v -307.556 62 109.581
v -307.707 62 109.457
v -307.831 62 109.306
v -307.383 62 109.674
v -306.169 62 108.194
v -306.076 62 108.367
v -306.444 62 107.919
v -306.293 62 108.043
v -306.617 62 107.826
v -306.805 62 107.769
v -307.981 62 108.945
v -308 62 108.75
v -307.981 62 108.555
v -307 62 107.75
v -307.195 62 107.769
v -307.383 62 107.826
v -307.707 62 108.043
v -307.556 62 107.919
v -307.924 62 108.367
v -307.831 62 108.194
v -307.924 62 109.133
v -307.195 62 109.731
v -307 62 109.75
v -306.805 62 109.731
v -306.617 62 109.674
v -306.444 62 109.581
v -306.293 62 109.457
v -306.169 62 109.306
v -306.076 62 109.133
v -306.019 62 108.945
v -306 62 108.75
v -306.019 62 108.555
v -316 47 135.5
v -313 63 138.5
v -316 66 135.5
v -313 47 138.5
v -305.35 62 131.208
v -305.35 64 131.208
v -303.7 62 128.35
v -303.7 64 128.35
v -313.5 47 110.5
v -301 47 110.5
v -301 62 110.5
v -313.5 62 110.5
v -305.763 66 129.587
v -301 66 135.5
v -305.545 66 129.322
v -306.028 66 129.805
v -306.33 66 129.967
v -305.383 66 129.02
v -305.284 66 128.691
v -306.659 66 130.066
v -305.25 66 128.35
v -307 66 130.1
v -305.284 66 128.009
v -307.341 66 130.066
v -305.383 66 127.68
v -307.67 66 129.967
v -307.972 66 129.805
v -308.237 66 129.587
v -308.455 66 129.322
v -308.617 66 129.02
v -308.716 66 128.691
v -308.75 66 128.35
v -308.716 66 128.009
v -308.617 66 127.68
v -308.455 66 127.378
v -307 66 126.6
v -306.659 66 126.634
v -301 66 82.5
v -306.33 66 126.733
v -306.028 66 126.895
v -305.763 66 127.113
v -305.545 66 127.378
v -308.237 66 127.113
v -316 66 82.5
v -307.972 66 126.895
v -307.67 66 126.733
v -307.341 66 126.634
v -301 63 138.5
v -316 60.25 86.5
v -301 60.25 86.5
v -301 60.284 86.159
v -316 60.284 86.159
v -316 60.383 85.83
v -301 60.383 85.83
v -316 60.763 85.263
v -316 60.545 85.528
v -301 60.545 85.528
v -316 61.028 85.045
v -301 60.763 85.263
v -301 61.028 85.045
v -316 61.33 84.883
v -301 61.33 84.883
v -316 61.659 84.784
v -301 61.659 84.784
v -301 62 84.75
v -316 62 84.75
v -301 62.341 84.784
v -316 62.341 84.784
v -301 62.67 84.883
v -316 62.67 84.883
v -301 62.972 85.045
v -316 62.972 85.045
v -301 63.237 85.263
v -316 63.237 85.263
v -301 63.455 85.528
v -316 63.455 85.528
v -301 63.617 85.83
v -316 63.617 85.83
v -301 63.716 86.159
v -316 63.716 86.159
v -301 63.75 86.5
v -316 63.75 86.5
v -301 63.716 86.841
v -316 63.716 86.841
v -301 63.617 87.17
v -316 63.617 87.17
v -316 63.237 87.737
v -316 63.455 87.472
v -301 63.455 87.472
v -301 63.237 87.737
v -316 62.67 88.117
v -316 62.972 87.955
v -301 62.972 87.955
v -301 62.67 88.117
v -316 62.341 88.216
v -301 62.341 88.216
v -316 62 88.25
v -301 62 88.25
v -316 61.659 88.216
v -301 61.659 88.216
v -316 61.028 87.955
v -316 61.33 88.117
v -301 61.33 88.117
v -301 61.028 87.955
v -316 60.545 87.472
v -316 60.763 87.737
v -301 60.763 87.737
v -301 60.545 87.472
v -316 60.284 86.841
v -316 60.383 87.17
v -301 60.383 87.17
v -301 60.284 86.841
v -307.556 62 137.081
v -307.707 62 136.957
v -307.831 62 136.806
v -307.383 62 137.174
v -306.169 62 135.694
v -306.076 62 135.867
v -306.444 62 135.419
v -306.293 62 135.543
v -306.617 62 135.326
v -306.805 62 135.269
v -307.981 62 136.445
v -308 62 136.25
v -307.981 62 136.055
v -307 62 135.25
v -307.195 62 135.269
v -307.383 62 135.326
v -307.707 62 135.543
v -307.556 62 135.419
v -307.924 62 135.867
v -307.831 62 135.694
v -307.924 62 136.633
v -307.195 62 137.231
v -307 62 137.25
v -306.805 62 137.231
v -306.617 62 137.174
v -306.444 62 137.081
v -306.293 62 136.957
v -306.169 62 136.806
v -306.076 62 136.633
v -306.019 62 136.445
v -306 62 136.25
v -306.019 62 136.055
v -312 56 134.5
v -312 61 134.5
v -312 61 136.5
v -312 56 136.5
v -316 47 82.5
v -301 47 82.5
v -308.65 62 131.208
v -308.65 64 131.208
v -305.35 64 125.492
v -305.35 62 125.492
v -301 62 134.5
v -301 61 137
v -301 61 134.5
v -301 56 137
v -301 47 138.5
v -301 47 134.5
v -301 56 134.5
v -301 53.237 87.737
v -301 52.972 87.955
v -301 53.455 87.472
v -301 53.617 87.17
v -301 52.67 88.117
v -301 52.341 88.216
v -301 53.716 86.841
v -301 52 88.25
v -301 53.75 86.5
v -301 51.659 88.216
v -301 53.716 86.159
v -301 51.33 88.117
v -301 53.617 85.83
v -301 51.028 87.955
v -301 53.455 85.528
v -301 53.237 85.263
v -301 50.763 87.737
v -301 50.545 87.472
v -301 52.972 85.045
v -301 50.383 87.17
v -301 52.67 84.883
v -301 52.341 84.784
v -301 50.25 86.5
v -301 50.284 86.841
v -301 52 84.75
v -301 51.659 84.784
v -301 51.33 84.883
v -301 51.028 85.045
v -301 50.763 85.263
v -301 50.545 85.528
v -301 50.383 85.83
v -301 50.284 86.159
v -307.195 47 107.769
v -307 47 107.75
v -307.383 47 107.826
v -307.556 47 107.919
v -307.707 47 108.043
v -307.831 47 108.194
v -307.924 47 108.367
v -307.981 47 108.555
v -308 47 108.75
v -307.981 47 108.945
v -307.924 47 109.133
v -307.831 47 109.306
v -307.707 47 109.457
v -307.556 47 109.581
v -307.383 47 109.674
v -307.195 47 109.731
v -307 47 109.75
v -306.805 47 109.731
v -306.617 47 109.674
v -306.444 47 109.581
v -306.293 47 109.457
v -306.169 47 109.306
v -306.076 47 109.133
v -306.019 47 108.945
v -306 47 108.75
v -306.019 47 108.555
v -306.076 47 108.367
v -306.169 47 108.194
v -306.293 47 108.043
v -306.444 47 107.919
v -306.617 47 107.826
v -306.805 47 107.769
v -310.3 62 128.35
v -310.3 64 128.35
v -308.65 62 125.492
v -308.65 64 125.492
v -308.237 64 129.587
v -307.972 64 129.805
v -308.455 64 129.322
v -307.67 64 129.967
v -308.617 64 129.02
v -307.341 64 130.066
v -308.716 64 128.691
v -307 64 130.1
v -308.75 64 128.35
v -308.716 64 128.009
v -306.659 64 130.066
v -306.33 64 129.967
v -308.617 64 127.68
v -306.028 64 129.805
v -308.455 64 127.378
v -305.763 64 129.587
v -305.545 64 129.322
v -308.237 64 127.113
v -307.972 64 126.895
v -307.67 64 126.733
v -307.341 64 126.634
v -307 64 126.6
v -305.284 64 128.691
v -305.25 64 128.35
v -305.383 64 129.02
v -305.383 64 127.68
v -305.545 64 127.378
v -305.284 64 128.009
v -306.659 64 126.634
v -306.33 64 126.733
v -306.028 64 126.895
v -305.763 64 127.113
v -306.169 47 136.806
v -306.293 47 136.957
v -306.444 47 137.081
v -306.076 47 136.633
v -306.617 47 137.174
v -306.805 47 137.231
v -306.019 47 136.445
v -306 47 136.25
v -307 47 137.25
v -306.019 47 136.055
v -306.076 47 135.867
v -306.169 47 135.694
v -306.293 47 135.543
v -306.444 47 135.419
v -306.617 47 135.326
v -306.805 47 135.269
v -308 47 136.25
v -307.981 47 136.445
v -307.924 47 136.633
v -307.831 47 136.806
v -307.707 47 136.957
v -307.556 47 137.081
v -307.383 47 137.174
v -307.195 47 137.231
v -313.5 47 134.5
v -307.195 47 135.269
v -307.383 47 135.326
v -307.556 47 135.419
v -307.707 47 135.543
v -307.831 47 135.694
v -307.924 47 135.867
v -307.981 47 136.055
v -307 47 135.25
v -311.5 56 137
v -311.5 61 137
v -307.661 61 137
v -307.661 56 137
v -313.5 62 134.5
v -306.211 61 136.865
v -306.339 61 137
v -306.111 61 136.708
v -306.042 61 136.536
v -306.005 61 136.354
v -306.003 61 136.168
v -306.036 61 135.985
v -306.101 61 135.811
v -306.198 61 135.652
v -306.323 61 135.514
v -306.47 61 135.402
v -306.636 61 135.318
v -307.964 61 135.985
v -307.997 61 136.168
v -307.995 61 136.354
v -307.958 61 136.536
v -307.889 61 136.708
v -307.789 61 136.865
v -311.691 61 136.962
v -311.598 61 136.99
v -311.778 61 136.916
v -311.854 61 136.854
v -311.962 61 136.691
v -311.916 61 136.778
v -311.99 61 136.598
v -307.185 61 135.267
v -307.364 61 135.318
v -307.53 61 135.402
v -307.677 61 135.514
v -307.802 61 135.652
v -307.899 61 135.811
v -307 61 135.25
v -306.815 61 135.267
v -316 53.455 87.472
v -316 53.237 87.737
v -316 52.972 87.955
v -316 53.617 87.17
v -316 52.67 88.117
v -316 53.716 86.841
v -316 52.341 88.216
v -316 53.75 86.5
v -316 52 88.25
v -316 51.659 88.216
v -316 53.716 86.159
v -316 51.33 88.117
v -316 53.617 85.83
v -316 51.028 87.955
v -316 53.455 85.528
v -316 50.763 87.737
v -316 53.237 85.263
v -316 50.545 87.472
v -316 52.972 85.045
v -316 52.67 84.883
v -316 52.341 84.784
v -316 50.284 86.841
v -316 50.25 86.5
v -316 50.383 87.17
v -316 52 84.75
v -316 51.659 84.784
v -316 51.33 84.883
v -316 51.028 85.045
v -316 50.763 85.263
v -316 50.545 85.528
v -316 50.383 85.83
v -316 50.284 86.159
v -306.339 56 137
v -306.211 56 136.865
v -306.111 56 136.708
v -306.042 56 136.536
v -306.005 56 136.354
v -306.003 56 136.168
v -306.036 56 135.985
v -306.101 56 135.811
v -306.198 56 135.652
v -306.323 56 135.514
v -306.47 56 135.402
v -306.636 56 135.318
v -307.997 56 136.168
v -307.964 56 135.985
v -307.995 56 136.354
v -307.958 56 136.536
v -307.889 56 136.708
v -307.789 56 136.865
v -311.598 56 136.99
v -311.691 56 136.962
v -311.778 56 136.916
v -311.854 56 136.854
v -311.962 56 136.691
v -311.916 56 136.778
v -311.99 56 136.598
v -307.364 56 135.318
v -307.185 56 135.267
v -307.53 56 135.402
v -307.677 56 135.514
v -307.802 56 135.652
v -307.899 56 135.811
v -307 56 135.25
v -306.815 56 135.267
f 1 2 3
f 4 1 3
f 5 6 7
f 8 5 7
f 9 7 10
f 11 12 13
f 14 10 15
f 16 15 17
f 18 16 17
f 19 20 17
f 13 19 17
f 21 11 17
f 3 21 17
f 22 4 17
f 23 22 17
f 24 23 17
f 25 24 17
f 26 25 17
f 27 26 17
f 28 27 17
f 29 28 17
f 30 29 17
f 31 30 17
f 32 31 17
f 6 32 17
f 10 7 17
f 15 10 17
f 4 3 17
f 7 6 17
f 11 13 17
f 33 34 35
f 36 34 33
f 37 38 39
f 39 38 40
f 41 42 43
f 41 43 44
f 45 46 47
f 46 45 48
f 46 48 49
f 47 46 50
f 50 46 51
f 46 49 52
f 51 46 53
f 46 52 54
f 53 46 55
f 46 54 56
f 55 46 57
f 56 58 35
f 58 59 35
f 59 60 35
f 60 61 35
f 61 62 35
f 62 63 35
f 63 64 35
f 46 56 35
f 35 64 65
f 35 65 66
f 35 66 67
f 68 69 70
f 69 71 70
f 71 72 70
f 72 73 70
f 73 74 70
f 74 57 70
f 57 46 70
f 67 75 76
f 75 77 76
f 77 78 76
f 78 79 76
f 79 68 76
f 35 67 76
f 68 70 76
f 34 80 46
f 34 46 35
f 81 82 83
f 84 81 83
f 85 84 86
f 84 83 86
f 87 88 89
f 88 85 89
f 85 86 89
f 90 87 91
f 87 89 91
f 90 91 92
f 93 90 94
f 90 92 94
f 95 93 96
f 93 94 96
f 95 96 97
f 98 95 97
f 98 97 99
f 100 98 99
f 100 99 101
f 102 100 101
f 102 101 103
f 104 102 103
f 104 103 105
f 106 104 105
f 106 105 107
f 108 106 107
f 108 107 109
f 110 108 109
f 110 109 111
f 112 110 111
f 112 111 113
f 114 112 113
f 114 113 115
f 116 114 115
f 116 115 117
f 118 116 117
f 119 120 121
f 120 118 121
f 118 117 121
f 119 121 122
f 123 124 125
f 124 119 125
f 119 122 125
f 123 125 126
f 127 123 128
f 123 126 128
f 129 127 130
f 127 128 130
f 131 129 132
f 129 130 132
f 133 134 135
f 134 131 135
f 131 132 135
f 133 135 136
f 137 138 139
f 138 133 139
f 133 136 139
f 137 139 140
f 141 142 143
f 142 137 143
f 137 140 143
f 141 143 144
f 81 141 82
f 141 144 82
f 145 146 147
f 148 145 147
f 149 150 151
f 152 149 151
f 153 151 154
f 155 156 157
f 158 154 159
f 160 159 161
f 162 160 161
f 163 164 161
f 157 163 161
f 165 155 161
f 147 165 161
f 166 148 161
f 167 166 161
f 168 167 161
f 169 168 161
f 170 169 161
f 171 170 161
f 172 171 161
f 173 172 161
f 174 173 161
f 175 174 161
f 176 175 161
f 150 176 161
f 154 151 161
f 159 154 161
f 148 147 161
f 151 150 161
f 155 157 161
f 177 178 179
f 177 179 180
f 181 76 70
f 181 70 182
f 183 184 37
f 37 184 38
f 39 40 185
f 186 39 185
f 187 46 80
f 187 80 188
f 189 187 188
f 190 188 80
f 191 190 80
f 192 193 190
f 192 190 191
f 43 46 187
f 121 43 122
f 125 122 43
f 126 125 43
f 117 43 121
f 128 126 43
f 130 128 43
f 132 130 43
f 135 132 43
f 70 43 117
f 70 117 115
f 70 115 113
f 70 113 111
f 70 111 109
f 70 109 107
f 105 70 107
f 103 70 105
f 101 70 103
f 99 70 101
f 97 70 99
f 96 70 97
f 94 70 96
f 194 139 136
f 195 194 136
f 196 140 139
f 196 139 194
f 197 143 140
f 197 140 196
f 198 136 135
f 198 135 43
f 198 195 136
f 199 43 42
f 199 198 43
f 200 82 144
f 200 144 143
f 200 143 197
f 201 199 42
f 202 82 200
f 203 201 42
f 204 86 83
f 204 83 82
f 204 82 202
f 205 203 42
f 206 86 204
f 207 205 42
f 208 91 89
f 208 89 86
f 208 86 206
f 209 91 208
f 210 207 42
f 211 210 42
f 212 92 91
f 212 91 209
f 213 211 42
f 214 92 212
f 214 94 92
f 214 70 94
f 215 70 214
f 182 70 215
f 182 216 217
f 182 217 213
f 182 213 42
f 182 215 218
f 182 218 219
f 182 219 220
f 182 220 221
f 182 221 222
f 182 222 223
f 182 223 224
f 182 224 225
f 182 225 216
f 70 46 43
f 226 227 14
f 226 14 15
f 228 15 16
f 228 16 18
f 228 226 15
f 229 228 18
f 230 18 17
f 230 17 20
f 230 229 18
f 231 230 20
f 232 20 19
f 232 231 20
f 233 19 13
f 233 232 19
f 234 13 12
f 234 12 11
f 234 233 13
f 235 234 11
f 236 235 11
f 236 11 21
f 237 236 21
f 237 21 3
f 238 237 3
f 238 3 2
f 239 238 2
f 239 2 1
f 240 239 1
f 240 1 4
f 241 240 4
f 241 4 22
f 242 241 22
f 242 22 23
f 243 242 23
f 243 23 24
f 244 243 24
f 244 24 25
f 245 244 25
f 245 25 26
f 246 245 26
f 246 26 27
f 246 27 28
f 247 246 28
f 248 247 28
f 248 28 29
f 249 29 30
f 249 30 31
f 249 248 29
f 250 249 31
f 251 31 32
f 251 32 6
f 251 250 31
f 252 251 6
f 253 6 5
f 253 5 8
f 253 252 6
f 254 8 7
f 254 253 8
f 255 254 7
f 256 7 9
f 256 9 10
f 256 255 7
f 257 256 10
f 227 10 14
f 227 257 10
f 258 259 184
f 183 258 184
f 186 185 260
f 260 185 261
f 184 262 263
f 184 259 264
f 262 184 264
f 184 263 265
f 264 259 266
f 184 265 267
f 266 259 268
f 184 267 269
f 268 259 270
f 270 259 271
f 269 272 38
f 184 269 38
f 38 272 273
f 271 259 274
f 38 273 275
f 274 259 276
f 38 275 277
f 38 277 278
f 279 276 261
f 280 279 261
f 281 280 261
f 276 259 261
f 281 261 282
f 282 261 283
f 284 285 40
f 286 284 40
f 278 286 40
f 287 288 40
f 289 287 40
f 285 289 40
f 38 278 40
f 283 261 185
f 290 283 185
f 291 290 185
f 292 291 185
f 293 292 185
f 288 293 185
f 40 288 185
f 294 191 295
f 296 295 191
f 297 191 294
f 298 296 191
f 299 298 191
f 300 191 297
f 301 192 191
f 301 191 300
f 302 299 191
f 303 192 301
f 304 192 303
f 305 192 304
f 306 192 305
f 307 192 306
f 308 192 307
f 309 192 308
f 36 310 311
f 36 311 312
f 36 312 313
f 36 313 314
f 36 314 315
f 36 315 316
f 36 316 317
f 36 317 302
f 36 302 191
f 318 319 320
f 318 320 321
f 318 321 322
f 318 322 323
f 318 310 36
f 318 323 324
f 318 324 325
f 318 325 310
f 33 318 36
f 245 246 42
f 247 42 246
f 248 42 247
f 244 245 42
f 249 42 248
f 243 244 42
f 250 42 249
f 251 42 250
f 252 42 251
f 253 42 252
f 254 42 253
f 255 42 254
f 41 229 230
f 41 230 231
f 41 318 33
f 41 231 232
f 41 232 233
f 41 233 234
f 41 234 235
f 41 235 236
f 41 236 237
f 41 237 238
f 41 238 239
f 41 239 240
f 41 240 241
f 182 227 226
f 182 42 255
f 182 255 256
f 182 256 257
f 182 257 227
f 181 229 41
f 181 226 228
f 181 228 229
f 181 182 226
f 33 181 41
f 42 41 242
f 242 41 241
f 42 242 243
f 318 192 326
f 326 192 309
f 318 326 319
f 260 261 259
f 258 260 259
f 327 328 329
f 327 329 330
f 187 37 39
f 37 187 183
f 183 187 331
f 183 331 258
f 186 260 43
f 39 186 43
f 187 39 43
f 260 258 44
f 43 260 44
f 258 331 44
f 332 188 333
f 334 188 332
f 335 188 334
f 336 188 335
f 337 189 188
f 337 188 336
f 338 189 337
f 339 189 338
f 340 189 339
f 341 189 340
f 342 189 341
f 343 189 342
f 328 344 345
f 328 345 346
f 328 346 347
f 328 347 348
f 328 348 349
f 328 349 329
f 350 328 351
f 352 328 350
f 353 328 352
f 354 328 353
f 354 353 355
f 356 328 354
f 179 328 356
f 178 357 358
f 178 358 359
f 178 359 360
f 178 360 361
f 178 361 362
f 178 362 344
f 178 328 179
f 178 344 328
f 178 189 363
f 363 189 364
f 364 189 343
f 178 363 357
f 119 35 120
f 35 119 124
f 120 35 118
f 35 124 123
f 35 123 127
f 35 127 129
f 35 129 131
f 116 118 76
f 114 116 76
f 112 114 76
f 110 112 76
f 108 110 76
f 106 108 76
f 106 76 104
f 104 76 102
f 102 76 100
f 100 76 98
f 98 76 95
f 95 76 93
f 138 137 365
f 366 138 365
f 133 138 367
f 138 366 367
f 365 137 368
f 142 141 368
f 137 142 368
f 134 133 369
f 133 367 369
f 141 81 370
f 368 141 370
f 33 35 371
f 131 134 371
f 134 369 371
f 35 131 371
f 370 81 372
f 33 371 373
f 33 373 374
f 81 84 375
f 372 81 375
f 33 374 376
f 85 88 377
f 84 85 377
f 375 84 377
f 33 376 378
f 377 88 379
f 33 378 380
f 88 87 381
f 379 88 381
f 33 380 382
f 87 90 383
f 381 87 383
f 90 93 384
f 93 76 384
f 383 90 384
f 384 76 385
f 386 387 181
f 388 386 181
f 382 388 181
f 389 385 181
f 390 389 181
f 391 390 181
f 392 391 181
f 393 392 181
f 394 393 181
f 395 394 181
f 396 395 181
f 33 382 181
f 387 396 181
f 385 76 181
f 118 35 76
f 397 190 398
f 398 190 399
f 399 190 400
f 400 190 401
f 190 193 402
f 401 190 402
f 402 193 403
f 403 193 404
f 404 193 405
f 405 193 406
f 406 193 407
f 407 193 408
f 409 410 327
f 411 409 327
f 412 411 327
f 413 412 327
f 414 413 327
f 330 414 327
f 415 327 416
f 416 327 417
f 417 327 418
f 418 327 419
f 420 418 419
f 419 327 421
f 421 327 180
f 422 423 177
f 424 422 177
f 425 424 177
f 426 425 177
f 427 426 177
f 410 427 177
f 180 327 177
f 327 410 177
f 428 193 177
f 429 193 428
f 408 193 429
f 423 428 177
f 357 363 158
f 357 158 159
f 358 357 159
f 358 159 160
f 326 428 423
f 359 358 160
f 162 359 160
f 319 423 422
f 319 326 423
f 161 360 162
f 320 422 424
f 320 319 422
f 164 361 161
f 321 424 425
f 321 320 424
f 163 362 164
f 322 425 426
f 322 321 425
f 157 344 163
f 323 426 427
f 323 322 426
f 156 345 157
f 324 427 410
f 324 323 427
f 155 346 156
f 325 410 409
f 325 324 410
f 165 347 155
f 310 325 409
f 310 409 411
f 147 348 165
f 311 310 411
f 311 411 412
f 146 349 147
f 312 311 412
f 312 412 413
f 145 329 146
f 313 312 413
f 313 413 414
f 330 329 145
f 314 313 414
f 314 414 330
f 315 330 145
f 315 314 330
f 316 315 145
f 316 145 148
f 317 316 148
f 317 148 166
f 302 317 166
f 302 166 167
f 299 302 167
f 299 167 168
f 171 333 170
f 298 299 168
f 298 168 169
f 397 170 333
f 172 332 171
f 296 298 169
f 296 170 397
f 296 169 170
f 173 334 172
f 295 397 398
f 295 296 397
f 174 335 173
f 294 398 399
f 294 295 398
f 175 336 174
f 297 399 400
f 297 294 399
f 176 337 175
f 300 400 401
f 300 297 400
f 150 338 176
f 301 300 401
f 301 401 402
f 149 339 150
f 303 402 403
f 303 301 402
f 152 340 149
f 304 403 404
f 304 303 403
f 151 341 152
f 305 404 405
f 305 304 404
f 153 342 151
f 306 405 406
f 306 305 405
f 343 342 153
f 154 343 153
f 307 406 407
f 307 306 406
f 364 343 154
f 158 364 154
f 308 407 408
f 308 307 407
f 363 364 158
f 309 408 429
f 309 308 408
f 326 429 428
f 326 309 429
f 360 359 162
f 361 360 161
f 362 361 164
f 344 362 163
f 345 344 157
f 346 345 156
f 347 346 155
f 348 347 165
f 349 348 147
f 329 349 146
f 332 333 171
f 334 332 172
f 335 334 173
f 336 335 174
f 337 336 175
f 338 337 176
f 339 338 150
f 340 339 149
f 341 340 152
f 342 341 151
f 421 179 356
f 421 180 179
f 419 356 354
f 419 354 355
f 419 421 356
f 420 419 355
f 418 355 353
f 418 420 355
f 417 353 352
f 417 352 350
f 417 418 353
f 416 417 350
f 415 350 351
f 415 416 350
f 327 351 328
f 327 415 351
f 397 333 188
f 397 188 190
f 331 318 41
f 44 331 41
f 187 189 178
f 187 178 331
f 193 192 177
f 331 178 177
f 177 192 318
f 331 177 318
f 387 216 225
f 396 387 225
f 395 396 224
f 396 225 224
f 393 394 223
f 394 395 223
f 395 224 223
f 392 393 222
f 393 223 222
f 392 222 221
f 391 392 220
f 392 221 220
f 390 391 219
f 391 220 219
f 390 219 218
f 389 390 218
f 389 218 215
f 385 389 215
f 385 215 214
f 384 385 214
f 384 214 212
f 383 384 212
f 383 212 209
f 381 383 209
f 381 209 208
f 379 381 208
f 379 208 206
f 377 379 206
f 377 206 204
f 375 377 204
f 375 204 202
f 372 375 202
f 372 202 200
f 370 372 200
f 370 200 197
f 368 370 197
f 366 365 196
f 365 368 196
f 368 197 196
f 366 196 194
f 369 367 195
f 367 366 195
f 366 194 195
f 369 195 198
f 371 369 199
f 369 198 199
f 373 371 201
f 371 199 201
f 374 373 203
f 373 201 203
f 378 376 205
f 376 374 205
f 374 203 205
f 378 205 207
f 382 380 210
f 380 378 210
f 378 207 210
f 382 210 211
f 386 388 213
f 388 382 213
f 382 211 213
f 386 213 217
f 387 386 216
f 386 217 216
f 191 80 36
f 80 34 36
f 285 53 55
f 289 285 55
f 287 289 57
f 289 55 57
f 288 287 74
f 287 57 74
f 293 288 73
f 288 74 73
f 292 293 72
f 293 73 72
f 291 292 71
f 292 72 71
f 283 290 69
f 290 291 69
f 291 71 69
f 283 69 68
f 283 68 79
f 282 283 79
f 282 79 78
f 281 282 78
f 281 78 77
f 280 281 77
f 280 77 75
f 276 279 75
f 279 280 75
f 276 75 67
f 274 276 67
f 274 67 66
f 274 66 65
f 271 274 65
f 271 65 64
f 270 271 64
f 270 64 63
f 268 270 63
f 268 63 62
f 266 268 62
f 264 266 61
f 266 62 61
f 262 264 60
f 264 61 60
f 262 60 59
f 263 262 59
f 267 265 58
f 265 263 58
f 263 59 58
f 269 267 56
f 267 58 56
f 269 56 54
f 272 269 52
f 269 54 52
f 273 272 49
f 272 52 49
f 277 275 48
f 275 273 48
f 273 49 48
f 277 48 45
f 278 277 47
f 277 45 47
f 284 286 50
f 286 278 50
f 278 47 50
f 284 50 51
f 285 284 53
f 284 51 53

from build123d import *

# Parameters (mm, degrees)
BOX039_W                 = 5
BOX039_H                 = 12
BOX039_DEPTH             = 7.5
CYLINDER041_R            = 1.75
CYLINDER041_DEPTH        = 32
PRISM_DEPTH              = 10
SKETCH009_R              = 1
SKETCH009_W              = 24
SKETCH009_H              = 13
PAD004_DEPTH             = 30
CYLINDER039_R            = 1.75
CYLINDER039_DEPTH        = 32
CYLINDER039_ROLL_ANGLE   = -90
CYLINDER040_R            = 1.75
CYLINDER040_DEPTH        = 32
CYLINDER040_ROLL_ANGLE   = -90
BOX026_W                 = 19
BOX026_H                 = 15
BOX026_DEPTH             = 56
CHAMFER005_SIZE          = 3
FILLET054_R              = 0.5
CLONE013_PLACEMENT_ANGLE = -90


with BuildPart() as cubo015:
    # Box039 → Box039 (new body)
    with BuildSketch(Plane(origin=(9, 97, 127), x_dir=(1, 0, 0), z_dir=(0, 0, 1))):
        with Locations((2.5, 6)):
            Rectangle(BOX039_W, BOX039_H)
    extrude(amount=BOX039_DEPTH)


with BuildPart() as cilindro016:
    # Cylinder041 → Cylinder041 (new body)
    with BuildSketch(Plane(origin=(-5, 104, 125.85), x_dir=(0, -1, 0), z_dir=(1, 0, 0))):
        Circle(CYLINDER041_R)
    extrude(amount=CYLINDER041_DEPTH)


with BuildPart() as fusion030:
    # Prism → Prism (new body)
    with BuildSketch(Plane(origin=(6, 104, 125.85), x_dir=(0, -1, 0), z_dir=(1, 0, 0))):
        Polygon((3.3, 0), (1.65, 2.857884), (-1.65, 2.857884), (-3.3, 0), (-1.65, -2.857884), (1.65, -2.857884), align=None)
    extrude(amount=PRISM_DEPTH)

    # Fusion030: union Cilindro016
    add(cilindro016.part)


with BuildPart() as pad004:
    # Sketch009 → Pad004 (new body)
    with BuildSketch(Plane(origin=(38, -16, 143.25), x_dir=(0, 0, -1), z_dir=(1, 0, 0))):
        with Locations((37, 120)):
            Circle(SKETCH009_R)
        with Locations((9.5, 120)):
            Circle(SKETCH009_R)
        with Locations((23.25, 120)):
            Rectangle(SKETCH009_W, SKETCH009_H)
    extrude(amount=-PAD004_DEPTH)


with BuildPart() as cilindro014:
    # Cylinder039 → Cylinder039 (new body)
    with BuildSketch(Plane.XY):
        Circle(CYLINDER039_R)
    extrude(amount=CYLINDER039_DEPTH)


with BuildPart() as cilindro014_1:
    # Cylinder039 roll: moved
    add(cilindro014.part.rotate(Axis((0, 0, 0), (1, 0, 0)), CYLINDER039_ROLL_ANGLE))


with BuildPart() as cilindro014_2:
    # Cylinder039 placement: moved
    add(cilindro014_1.part.moved(Location((8, 90, 84))))


with BuildPart() as fusion029:
    # Cylinder040 → Cylinder040 (new body)
    with BuildSketch(Plane.XY):
        Circle(CYLINDER040_R)
    extrude(amount=CYLINDER040_DEPTH)


with BuildPart() as fusion029_1:
    # Cylinder040 roll: moved
    add(fusion029.part.rotate(Axis((0, 0, 0), (1, 0, 0)), CYLINDER040_ROLL_ANGLE))


with BuildPart() as fusion029_2:
    # Cylinder040 placement: moved
    add(fusion029_1.part.moved(Location((18, 90, 84))))

    # Fusion029: union Cilindro014
    add(cilindro014_2.part)


with BuildPart() as clone_of_arm:
    # Box026 → Box026 (new body)
    with BuildSketch(Plane(origin=(4, 98, 80), x_dir=(1, 0, 0), z_dir=(0, 0, 1))):
        with Locations((9.5, 7.5)):
            Rectangle(BOX026_W, BOX026_H)
    extrude(amount=BOX026_DEPTH)

    # Cut042: cut Fusion029
    add(fusion029_2.part, mode=Mode.SUBTRACT)

    # Cut043: cut Pad004
    add(pad004.part, mode=Mode.SUBTRACT)

    # Chamfer005
    chamfer005_edges = [clone_of_arm.edges().sort_by_distance(p)[0] for p in [
        (4, 105.5, 136),
        (13.5, 113, 136),
    ]]
    chamfer(chamfer005_edges, length=CHAMFER005_SIZE)

    # Cut044: cut Fusion030
    add(fusion030.part, mode=Mode.SUBTRACT)

    # Cut055: cut Cubo015
    add(cubo015.part, mode=Mode.SUBTRACT)

    # Fillet054
    fillet054_edges = [clone_of_arm.edges().sort_by_distance(p)[0] for p in [
        (11.5, 109, 134.5),
    ]]
    fillet(fillet054_edges, radius=FILLET054_R)


with BuildPart() as clone_of_arm_1:
    # Clone013 placement: moved
    add(clone_of_arm.part.moved(Location((-275, 70, 2.5))).rotate(Axis((-275, 70, 2.5), (0, 0, 1)), CLONE013_PLACEMENT_ANGLE))


with BuildPart() as clone_of_arm001:
    # Part__Mirroring008: instance of Clone of arm
    add(clone_of_arm_1.part.mirror(Plane(origin=(0, 0, 0), x_dir=(0, -1, 0), z_dir=(1, 0, 0))))


with BuildPart() as clone_of_arm001_1:
    # Part__Mirroring008 placement: moved
    add(clone_of_arm001.part.moved(Location((-478, 0, 0))))


solid = clone_of_arm001_1.part
